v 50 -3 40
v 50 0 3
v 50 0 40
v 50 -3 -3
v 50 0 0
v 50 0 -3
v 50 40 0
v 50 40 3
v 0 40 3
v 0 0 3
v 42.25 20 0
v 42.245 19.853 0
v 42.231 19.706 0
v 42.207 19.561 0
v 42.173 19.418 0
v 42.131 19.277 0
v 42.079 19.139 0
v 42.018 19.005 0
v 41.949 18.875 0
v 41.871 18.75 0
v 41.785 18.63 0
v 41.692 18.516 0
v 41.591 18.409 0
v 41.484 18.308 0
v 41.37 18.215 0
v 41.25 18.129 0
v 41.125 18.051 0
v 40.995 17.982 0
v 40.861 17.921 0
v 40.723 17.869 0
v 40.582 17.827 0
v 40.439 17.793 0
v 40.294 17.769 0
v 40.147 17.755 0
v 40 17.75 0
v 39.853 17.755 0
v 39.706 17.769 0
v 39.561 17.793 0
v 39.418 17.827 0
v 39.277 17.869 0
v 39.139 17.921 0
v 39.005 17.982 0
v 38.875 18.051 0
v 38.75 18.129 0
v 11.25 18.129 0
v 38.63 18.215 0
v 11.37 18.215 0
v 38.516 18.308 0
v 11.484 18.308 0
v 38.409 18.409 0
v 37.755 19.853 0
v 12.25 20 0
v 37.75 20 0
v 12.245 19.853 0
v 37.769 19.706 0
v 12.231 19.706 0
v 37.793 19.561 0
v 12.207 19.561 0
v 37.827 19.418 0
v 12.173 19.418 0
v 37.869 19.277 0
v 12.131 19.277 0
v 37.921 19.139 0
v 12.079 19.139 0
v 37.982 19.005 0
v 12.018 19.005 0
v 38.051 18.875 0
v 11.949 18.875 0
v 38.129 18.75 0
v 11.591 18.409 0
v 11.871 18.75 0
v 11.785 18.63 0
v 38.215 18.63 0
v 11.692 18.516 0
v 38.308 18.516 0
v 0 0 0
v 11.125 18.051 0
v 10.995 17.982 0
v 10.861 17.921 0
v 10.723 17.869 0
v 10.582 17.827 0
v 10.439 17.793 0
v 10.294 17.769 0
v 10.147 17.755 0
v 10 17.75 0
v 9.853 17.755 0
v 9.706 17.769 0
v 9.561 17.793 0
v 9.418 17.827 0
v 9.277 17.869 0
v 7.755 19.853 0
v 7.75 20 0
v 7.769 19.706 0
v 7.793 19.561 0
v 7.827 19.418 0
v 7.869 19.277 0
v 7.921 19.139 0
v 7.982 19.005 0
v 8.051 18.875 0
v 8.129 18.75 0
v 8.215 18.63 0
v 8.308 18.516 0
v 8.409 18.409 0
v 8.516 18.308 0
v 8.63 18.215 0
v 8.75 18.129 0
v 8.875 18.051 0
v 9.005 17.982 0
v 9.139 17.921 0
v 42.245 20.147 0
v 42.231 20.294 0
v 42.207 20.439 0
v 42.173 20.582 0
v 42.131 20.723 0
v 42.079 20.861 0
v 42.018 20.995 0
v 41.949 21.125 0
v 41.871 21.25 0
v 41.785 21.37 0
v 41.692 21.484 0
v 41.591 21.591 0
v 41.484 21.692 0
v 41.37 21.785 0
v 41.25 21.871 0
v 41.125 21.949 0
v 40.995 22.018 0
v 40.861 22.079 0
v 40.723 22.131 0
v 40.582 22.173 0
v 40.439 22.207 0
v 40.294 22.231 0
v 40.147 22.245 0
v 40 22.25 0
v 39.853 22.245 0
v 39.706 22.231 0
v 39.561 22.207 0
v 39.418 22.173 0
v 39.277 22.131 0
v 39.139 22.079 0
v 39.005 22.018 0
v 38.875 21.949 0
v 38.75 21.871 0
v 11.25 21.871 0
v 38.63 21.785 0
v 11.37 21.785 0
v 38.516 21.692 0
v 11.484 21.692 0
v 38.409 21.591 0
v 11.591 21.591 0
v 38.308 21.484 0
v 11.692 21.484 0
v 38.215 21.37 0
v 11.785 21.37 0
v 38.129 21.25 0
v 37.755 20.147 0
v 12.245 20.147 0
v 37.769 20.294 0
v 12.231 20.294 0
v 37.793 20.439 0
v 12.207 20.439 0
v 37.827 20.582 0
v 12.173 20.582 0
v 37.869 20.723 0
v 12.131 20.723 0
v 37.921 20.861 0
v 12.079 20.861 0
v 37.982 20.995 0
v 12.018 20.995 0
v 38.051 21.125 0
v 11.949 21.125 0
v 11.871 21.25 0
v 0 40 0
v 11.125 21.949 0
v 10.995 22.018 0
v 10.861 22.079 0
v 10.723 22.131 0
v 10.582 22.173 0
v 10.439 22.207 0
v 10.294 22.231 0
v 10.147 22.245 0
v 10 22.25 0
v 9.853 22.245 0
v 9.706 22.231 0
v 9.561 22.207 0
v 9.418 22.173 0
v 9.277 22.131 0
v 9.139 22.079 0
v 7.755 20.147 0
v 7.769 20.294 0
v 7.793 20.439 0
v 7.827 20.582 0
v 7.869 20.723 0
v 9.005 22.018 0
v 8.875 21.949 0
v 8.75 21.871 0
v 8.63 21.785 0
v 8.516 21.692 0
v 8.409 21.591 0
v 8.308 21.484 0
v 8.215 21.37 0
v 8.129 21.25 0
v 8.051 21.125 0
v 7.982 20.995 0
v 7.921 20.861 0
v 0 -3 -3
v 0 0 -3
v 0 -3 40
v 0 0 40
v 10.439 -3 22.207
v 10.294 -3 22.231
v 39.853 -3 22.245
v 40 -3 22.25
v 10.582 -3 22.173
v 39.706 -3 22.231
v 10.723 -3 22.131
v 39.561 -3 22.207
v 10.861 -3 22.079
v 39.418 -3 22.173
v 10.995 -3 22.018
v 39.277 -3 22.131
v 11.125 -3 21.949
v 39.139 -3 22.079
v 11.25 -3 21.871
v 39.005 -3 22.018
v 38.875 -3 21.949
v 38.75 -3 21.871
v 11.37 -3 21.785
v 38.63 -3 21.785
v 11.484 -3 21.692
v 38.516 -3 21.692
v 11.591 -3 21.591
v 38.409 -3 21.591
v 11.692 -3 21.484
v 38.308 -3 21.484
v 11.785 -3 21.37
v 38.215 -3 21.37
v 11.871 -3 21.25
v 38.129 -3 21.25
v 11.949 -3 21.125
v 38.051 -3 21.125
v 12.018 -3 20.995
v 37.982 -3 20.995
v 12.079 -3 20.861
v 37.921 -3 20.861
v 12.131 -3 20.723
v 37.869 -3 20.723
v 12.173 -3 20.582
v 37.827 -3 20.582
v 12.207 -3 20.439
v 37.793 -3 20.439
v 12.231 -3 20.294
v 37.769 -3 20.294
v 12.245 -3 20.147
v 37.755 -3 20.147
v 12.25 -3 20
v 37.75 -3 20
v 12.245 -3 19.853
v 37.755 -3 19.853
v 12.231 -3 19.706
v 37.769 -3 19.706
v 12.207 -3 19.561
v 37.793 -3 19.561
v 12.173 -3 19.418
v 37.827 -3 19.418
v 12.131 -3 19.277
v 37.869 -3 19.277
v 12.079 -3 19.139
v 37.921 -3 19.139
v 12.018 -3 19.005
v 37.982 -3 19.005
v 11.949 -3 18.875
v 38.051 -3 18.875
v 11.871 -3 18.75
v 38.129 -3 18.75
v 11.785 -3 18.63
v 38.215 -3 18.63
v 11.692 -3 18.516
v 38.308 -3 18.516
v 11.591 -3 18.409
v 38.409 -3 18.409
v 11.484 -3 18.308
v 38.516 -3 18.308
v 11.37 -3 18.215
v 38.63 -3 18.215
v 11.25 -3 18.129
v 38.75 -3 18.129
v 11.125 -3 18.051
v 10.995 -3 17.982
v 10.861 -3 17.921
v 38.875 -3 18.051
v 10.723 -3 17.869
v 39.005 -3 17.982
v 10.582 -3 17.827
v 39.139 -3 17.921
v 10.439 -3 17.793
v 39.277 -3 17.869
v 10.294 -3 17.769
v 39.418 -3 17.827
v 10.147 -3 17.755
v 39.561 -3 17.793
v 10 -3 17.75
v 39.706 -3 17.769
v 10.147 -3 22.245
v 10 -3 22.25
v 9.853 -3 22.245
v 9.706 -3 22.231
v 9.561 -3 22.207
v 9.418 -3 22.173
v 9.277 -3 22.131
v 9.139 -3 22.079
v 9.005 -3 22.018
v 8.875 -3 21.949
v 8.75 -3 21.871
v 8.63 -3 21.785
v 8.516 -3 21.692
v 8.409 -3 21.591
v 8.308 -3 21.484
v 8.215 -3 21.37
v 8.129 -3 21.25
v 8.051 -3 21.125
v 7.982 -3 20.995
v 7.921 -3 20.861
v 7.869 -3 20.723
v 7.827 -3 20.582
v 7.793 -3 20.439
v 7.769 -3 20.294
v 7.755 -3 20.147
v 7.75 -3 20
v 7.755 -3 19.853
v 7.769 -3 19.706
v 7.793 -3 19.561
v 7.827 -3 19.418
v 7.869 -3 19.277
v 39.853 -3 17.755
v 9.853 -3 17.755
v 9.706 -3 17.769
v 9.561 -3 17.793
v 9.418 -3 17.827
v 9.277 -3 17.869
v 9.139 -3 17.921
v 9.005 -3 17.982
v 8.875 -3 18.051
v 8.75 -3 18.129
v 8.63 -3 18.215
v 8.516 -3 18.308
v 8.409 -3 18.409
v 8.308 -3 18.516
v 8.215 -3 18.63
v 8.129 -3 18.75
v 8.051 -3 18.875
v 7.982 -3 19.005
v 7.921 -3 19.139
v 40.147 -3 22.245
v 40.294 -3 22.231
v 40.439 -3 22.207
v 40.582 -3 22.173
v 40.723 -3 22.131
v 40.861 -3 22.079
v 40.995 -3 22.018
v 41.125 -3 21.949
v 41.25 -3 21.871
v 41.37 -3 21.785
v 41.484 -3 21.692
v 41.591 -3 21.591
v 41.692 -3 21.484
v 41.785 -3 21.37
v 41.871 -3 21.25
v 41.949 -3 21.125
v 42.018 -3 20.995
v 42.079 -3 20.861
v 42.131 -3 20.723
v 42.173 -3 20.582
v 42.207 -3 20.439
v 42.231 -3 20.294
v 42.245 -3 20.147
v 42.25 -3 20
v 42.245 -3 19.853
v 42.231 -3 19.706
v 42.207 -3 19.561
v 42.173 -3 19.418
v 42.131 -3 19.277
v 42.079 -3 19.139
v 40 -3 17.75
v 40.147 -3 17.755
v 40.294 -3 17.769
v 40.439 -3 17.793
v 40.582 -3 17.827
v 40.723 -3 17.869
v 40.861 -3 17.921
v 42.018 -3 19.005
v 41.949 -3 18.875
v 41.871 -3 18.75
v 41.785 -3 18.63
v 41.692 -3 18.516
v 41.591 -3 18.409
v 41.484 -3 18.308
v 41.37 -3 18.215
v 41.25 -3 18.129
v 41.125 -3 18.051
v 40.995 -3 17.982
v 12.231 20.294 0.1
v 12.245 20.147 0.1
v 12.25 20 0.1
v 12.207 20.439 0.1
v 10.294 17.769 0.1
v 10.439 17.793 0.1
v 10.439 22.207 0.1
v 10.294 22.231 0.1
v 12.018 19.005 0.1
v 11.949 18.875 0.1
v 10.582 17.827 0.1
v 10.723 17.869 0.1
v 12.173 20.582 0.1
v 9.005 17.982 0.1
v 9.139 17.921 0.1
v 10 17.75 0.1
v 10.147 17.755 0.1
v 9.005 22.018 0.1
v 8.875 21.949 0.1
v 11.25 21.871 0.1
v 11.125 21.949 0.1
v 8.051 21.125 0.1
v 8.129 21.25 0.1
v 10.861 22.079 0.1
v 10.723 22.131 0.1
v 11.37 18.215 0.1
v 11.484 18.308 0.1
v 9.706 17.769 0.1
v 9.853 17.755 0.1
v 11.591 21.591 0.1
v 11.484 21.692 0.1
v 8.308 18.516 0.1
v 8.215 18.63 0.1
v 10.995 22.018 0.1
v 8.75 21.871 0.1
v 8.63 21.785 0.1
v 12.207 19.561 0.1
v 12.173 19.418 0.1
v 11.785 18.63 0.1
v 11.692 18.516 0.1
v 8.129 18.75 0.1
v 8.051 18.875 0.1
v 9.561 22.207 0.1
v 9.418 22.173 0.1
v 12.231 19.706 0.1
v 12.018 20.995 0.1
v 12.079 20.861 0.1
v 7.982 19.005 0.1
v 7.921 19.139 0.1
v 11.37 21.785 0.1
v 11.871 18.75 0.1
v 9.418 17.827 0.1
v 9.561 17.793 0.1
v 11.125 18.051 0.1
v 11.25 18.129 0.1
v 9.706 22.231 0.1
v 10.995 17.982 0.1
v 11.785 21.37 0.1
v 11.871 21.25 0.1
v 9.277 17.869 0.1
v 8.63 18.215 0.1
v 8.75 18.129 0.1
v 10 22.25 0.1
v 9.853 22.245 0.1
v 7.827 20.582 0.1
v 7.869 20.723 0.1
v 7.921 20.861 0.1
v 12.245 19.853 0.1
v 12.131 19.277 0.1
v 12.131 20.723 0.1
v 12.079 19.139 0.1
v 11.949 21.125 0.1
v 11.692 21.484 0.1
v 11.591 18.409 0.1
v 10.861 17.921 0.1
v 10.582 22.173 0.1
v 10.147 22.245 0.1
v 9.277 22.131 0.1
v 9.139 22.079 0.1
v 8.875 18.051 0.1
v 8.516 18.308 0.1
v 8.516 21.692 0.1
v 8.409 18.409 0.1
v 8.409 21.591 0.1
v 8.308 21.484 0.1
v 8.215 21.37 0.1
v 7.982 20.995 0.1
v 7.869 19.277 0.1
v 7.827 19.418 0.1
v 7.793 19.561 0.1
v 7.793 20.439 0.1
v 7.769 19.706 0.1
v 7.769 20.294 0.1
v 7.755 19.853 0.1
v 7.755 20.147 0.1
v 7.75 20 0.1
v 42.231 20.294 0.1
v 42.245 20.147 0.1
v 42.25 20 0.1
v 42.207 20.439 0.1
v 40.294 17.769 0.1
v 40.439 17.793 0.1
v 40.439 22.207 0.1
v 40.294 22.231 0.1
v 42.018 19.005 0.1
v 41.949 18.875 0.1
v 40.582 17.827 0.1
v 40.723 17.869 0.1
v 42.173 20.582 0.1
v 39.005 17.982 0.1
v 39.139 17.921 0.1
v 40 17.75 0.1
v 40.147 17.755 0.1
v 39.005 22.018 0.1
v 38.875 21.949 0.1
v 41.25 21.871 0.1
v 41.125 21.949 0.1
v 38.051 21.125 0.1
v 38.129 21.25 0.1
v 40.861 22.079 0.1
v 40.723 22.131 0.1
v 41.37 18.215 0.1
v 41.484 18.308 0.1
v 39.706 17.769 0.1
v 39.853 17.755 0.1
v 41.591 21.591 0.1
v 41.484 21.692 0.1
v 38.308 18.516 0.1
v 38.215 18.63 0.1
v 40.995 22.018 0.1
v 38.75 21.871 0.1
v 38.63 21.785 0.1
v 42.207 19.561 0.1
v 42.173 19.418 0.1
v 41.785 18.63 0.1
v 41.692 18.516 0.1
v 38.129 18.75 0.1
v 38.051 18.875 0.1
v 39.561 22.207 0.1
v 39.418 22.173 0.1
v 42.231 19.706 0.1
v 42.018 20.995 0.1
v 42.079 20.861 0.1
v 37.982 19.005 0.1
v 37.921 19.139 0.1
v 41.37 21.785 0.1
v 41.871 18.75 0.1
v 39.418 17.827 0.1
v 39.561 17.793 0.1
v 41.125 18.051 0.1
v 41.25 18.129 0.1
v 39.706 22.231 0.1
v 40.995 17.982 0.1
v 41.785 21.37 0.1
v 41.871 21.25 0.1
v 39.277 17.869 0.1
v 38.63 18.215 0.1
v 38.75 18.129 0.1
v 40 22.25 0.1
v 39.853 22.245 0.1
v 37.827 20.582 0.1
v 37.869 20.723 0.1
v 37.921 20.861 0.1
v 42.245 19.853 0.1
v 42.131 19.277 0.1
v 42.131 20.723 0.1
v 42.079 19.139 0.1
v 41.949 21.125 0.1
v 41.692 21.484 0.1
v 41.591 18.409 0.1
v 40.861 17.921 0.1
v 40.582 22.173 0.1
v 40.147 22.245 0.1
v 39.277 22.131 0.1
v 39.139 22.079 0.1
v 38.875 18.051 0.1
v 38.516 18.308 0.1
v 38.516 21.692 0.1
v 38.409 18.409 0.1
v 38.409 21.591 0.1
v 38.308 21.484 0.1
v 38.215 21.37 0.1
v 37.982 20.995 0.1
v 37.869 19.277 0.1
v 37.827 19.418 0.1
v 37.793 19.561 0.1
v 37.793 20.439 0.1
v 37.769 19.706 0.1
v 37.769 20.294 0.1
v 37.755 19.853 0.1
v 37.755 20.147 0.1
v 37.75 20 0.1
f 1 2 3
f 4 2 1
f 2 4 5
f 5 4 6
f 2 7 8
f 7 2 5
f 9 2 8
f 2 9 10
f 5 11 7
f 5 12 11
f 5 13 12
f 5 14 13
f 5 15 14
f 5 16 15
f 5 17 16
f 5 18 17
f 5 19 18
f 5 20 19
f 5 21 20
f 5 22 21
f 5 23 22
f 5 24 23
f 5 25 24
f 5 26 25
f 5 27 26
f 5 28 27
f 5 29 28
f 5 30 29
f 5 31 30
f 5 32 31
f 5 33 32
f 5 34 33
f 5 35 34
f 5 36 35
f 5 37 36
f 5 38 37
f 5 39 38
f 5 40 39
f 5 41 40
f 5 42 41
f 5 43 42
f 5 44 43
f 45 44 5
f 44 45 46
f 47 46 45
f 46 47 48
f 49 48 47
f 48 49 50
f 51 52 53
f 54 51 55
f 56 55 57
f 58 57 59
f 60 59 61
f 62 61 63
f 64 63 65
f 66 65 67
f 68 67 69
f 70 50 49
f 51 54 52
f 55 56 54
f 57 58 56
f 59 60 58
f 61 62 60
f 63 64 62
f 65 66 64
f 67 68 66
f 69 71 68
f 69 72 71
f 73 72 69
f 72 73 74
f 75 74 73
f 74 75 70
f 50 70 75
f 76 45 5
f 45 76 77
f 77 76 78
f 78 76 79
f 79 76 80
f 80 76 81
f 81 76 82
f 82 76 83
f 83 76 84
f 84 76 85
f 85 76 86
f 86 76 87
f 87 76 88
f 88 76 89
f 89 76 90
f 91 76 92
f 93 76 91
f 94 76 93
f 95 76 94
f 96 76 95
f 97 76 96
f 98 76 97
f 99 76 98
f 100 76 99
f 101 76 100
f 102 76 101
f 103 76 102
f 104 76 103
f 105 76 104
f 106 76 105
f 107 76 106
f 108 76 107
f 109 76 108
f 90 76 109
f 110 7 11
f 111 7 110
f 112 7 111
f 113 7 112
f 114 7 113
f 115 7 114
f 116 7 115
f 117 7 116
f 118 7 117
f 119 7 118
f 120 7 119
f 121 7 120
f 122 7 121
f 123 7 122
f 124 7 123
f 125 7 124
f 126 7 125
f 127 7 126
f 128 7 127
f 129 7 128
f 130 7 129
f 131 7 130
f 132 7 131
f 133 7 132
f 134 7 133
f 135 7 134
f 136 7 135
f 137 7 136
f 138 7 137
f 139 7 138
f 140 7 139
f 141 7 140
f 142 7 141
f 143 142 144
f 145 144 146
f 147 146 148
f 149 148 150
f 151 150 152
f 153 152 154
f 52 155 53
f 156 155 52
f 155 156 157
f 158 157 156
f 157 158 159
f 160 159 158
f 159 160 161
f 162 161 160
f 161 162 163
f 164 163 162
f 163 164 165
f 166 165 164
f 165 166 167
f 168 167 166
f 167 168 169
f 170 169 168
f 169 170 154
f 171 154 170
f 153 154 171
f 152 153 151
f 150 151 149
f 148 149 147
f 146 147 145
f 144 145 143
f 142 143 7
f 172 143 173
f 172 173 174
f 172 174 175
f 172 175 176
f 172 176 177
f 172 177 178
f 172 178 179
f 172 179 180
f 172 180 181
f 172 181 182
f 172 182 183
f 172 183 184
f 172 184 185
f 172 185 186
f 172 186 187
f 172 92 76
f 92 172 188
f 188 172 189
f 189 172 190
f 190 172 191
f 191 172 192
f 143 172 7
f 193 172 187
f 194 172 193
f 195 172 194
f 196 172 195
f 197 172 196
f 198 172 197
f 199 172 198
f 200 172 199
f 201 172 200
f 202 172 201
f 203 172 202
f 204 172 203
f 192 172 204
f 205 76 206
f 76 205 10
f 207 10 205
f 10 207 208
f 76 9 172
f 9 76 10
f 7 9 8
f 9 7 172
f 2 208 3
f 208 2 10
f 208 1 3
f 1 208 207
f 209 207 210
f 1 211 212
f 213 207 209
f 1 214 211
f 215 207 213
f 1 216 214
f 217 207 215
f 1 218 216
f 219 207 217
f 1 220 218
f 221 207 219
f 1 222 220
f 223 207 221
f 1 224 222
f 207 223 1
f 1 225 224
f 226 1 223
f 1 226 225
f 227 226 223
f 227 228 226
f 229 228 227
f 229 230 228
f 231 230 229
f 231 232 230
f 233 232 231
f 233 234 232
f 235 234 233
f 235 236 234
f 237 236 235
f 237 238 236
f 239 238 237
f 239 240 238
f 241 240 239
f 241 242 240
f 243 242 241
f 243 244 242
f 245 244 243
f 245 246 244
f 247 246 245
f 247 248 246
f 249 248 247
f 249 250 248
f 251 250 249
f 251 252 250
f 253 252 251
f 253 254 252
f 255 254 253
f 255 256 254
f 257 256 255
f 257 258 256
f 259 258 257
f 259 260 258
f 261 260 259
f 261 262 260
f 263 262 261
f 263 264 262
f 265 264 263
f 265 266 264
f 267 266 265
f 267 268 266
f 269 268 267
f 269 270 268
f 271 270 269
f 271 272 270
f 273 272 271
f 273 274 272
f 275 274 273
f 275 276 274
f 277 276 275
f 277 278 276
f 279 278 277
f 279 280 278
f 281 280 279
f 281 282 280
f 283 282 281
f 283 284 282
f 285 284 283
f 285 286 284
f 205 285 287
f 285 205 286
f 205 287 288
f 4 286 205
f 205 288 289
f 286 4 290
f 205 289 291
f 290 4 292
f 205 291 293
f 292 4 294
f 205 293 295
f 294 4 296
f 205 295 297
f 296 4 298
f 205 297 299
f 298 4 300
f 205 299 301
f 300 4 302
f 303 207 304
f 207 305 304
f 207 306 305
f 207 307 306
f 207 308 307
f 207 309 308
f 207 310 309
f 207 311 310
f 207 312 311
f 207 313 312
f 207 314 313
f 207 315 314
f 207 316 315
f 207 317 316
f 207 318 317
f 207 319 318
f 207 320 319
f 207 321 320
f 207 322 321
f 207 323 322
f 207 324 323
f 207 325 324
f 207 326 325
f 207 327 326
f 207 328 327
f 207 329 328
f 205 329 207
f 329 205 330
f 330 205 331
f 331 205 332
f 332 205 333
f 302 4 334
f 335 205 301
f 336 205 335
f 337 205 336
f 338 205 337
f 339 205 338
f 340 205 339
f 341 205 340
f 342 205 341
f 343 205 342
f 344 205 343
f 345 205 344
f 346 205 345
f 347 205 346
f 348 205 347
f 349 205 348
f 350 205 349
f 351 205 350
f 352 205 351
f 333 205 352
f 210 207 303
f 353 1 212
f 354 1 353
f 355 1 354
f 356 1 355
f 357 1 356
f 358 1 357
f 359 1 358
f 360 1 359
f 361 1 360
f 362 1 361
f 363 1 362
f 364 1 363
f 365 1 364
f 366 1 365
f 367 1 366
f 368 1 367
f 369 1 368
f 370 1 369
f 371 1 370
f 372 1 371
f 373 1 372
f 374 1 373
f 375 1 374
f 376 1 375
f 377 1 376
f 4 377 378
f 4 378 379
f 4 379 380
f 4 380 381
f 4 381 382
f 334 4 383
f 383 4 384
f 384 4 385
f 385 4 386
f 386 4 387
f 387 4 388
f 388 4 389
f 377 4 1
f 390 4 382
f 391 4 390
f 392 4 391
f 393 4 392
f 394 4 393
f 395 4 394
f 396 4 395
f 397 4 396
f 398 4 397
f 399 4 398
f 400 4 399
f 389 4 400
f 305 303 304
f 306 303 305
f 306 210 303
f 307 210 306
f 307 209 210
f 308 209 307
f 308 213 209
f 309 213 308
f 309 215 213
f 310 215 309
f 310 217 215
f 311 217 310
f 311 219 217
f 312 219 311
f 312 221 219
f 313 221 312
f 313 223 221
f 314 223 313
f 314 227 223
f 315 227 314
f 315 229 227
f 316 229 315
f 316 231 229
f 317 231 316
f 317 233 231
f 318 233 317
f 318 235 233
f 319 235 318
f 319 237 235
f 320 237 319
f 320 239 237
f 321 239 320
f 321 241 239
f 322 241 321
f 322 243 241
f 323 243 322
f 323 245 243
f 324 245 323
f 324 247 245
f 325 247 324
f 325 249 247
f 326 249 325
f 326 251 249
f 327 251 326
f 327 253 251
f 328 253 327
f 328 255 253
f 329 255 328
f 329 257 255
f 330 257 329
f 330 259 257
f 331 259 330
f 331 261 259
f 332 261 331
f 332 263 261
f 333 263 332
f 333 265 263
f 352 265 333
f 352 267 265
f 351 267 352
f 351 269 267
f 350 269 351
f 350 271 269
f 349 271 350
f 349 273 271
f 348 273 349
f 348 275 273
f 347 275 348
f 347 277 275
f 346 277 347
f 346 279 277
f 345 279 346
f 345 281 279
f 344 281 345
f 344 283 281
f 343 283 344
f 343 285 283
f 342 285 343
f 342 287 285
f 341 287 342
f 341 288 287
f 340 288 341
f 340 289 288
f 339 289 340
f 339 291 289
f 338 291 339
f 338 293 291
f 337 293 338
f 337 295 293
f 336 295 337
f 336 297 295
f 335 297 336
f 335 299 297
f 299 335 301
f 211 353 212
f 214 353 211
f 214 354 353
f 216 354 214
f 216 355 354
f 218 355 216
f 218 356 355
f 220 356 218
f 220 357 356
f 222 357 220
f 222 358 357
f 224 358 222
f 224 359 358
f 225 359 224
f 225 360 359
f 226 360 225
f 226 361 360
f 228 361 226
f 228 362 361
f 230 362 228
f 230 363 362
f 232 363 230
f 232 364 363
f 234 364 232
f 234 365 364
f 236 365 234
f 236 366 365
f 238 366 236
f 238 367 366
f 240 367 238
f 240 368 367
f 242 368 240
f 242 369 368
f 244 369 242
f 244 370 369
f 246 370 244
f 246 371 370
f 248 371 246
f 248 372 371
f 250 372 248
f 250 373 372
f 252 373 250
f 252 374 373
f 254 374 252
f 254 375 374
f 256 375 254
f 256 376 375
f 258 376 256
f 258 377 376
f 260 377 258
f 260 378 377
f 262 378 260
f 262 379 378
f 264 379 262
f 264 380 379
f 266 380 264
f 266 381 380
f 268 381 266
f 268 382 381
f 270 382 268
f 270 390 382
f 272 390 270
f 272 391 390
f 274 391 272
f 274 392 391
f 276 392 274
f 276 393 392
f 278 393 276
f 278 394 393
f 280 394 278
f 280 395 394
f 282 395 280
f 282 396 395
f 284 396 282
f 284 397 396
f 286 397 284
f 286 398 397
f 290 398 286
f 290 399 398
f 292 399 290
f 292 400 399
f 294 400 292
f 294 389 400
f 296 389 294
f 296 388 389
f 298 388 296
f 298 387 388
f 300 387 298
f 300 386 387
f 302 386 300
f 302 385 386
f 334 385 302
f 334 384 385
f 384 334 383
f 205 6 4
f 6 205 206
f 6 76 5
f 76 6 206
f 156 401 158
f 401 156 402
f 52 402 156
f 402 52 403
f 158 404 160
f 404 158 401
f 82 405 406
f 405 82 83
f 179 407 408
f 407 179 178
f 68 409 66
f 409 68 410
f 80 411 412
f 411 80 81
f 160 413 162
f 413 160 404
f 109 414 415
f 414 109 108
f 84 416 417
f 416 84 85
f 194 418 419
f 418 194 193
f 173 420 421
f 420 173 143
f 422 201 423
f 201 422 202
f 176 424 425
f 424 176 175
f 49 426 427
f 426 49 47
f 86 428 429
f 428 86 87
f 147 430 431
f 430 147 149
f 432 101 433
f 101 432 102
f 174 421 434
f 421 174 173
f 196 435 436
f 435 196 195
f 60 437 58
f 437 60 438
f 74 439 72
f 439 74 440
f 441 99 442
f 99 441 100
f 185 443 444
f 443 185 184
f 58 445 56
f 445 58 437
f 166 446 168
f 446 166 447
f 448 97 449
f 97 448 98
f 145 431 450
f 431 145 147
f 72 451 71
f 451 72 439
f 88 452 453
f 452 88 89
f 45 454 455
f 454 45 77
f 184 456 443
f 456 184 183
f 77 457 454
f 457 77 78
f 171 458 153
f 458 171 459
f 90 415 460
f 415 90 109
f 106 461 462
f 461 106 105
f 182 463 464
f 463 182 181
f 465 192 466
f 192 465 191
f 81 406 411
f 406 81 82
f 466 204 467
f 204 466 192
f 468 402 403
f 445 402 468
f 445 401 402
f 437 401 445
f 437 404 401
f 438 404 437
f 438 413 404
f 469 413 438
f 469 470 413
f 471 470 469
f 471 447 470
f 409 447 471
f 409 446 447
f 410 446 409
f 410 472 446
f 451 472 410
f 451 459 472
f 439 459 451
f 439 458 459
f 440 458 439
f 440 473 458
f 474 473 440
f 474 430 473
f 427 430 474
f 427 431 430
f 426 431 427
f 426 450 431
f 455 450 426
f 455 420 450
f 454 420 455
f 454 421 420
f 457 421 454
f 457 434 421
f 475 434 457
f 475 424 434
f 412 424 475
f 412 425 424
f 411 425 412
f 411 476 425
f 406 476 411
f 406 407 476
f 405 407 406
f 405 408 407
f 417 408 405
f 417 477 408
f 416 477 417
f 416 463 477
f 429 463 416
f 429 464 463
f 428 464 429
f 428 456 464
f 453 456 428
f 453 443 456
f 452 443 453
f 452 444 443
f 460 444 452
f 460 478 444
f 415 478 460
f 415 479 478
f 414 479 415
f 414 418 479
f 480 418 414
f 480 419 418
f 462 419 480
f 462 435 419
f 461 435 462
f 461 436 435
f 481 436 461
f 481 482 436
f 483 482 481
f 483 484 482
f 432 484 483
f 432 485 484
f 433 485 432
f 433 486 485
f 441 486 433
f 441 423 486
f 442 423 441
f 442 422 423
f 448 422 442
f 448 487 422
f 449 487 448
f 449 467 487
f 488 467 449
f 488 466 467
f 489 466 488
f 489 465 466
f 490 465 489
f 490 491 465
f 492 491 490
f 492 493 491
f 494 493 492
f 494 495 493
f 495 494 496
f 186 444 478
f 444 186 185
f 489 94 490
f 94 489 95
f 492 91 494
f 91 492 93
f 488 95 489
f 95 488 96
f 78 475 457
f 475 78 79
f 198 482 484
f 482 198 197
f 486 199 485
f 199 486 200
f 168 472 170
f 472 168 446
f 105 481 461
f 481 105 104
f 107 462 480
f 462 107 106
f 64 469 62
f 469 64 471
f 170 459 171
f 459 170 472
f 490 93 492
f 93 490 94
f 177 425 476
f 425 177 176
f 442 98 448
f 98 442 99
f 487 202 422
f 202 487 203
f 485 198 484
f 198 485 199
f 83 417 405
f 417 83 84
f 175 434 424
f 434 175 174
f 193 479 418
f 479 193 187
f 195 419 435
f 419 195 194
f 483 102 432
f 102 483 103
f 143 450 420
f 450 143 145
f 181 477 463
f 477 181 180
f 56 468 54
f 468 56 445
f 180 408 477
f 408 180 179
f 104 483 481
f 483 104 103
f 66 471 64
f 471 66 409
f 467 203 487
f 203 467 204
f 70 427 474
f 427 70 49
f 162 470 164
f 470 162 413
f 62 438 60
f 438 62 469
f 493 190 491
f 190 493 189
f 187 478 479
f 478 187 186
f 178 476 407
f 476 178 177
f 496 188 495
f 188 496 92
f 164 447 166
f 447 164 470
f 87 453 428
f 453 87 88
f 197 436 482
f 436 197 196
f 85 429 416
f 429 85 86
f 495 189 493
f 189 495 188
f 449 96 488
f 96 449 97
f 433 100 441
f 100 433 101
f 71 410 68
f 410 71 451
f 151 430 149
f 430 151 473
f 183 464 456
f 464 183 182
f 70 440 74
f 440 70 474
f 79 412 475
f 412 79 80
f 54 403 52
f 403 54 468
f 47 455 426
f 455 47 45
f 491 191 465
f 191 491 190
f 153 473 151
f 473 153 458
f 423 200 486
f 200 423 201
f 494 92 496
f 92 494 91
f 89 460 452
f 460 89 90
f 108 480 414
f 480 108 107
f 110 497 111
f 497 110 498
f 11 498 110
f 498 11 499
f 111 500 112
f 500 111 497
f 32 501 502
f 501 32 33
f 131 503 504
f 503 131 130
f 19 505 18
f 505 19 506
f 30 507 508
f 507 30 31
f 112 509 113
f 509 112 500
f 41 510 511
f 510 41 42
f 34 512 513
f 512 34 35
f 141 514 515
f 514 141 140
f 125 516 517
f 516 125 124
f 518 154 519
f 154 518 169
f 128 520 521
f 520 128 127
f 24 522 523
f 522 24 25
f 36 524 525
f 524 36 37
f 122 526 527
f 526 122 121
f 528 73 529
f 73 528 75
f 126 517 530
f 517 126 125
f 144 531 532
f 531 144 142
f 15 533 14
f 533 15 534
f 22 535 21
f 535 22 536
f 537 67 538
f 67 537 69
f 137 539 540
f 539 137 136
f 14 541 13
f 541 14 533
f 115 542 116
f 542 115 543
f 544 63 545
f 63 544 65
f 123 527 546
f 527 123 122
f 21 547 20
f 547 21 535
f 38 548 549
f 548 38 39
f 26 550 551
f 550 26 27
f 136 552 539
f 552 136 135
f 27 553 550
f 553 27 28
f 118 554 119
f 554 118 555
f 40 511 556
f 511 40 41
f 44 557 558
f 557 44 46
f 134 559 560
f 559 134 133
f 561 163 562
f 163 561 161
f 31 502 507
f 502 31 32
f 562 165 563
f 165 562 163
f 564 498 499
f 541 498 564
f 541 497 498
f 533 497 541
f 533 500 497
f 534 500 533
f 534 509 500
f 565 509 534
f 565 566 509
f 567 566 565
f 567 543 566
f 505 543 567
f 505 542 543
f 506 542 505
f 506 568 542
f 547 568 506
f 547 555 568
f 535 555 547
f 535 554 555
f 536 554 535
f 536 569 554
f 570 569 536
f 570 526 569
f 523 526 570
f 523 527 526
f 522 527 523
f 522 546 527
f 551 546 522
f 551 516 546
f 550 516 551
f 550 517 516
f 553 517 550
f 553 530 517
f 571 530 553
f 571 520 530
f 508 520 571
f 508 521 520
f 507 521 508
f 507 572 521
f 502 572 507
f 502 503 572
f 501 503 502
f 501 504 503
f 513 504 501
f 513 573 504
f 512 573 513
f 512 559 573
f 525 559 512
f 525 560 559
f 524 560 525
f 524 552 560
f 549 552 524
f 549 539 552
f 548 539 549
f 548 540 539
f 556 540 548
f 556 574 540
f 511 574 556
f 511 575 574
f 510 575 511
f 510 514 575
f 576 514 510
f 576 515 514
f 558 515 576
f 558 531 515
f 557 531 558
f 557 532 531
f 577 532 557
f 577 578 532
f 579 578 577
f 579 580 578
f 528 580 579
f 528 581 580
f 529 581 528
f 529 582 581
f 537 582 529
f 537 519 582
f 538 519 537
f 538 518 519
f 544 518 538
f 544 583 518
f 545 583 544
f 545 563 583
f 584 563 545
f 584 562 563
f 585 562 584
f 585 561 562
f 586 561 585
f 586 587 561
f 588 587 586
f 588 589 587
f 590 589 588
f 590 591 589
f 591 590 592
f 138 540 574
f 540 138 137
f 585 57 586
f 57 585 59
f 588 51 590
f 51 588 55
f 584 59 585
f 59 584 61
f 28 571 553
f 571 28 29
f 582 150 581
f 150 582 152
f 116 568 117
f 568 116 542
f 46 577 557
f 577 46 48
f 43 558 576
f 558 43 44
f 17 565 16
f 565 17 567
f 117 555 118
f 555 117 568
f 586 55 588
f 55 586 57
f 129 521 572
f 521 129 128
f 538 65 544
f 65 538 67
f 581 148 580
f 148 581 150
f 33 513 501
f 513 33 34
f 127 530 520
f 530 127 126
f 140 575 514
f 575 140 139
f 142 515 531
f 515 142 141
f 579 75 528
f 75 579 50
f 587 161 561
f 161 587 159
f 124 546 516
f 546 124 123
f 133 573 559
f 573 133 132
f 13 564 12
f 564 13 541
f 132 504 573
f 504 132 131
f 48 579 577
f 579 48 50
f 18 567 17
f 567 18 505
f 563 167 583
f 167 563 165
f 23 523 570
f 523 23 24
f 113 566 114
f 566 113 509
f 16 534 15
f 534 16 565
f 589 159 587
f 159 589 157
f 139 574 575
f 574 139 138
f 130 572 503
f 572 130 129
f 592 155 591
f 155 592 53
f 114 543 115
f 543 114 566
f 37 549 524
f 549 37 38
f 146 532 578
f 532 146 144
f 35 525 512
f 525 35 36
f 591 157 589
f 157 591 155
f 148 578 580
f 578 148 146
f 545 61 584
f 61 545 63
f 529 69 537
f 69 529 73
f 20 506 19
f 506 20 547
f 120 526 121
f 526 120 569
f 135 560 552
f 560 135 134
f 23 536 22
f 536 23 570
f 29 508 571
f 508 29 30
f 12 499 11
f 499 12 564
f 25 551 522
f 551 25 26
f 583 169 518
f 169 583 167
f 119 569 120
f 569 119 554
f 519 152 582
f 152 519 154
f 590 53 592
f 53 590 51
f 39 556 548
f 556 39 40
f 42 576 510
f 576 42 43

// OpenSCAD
$fn = 96;

width = 50;
depth = 40;
height = 40;
thickness = 3;

hole_d = 4.5;
countersink_d = 8;
countersink_depth = 2;

hole_x = [10, width - 10];
hole_y = depth / 2;
hole_z = height / 2;

difference() {
    union() {
        // Horizontal flange: +Y direction
        cube([width, depth, thickness], center = false);

        // Vertical flange: +Z direction
        translate([0, -thickness, 0])
            cube([width, thickness, height], center = false);

        // Bent corner material
        translate([0, -thickness, -thickness])
            cube([width, thickness, thickness], center = false);
    }

    // Countersunk holes in horizontal flange
    for (x = hole_x) {
        translate([x, hole_y, -thickness - 0.1])
            cylinder(
                h = thickness + 0.2,
                d = hole_d
            );

        translate([x, hole_y, -thickness])
            cylinder(
                h = countersink_depth,
                d1 = countersink_d,
                d2 = hole_d
            );
    }

    // Countersunk holes in vertical flange
    for (x = hole_x) {
        translate([x, -thickness - 0.1, hole_z])
            rotate([90, 0, 0])
                cylinder(
                    h = thickness + 0.2,
                    d = hole_d
                );

        translate([x, -thickness, hole_z])
            rotate([90, 0, 0])
                cylinder(
                    h = countersink_depth,
                    d1 = hole_d,
                    d2 = countersink_d
                );
    }
}
